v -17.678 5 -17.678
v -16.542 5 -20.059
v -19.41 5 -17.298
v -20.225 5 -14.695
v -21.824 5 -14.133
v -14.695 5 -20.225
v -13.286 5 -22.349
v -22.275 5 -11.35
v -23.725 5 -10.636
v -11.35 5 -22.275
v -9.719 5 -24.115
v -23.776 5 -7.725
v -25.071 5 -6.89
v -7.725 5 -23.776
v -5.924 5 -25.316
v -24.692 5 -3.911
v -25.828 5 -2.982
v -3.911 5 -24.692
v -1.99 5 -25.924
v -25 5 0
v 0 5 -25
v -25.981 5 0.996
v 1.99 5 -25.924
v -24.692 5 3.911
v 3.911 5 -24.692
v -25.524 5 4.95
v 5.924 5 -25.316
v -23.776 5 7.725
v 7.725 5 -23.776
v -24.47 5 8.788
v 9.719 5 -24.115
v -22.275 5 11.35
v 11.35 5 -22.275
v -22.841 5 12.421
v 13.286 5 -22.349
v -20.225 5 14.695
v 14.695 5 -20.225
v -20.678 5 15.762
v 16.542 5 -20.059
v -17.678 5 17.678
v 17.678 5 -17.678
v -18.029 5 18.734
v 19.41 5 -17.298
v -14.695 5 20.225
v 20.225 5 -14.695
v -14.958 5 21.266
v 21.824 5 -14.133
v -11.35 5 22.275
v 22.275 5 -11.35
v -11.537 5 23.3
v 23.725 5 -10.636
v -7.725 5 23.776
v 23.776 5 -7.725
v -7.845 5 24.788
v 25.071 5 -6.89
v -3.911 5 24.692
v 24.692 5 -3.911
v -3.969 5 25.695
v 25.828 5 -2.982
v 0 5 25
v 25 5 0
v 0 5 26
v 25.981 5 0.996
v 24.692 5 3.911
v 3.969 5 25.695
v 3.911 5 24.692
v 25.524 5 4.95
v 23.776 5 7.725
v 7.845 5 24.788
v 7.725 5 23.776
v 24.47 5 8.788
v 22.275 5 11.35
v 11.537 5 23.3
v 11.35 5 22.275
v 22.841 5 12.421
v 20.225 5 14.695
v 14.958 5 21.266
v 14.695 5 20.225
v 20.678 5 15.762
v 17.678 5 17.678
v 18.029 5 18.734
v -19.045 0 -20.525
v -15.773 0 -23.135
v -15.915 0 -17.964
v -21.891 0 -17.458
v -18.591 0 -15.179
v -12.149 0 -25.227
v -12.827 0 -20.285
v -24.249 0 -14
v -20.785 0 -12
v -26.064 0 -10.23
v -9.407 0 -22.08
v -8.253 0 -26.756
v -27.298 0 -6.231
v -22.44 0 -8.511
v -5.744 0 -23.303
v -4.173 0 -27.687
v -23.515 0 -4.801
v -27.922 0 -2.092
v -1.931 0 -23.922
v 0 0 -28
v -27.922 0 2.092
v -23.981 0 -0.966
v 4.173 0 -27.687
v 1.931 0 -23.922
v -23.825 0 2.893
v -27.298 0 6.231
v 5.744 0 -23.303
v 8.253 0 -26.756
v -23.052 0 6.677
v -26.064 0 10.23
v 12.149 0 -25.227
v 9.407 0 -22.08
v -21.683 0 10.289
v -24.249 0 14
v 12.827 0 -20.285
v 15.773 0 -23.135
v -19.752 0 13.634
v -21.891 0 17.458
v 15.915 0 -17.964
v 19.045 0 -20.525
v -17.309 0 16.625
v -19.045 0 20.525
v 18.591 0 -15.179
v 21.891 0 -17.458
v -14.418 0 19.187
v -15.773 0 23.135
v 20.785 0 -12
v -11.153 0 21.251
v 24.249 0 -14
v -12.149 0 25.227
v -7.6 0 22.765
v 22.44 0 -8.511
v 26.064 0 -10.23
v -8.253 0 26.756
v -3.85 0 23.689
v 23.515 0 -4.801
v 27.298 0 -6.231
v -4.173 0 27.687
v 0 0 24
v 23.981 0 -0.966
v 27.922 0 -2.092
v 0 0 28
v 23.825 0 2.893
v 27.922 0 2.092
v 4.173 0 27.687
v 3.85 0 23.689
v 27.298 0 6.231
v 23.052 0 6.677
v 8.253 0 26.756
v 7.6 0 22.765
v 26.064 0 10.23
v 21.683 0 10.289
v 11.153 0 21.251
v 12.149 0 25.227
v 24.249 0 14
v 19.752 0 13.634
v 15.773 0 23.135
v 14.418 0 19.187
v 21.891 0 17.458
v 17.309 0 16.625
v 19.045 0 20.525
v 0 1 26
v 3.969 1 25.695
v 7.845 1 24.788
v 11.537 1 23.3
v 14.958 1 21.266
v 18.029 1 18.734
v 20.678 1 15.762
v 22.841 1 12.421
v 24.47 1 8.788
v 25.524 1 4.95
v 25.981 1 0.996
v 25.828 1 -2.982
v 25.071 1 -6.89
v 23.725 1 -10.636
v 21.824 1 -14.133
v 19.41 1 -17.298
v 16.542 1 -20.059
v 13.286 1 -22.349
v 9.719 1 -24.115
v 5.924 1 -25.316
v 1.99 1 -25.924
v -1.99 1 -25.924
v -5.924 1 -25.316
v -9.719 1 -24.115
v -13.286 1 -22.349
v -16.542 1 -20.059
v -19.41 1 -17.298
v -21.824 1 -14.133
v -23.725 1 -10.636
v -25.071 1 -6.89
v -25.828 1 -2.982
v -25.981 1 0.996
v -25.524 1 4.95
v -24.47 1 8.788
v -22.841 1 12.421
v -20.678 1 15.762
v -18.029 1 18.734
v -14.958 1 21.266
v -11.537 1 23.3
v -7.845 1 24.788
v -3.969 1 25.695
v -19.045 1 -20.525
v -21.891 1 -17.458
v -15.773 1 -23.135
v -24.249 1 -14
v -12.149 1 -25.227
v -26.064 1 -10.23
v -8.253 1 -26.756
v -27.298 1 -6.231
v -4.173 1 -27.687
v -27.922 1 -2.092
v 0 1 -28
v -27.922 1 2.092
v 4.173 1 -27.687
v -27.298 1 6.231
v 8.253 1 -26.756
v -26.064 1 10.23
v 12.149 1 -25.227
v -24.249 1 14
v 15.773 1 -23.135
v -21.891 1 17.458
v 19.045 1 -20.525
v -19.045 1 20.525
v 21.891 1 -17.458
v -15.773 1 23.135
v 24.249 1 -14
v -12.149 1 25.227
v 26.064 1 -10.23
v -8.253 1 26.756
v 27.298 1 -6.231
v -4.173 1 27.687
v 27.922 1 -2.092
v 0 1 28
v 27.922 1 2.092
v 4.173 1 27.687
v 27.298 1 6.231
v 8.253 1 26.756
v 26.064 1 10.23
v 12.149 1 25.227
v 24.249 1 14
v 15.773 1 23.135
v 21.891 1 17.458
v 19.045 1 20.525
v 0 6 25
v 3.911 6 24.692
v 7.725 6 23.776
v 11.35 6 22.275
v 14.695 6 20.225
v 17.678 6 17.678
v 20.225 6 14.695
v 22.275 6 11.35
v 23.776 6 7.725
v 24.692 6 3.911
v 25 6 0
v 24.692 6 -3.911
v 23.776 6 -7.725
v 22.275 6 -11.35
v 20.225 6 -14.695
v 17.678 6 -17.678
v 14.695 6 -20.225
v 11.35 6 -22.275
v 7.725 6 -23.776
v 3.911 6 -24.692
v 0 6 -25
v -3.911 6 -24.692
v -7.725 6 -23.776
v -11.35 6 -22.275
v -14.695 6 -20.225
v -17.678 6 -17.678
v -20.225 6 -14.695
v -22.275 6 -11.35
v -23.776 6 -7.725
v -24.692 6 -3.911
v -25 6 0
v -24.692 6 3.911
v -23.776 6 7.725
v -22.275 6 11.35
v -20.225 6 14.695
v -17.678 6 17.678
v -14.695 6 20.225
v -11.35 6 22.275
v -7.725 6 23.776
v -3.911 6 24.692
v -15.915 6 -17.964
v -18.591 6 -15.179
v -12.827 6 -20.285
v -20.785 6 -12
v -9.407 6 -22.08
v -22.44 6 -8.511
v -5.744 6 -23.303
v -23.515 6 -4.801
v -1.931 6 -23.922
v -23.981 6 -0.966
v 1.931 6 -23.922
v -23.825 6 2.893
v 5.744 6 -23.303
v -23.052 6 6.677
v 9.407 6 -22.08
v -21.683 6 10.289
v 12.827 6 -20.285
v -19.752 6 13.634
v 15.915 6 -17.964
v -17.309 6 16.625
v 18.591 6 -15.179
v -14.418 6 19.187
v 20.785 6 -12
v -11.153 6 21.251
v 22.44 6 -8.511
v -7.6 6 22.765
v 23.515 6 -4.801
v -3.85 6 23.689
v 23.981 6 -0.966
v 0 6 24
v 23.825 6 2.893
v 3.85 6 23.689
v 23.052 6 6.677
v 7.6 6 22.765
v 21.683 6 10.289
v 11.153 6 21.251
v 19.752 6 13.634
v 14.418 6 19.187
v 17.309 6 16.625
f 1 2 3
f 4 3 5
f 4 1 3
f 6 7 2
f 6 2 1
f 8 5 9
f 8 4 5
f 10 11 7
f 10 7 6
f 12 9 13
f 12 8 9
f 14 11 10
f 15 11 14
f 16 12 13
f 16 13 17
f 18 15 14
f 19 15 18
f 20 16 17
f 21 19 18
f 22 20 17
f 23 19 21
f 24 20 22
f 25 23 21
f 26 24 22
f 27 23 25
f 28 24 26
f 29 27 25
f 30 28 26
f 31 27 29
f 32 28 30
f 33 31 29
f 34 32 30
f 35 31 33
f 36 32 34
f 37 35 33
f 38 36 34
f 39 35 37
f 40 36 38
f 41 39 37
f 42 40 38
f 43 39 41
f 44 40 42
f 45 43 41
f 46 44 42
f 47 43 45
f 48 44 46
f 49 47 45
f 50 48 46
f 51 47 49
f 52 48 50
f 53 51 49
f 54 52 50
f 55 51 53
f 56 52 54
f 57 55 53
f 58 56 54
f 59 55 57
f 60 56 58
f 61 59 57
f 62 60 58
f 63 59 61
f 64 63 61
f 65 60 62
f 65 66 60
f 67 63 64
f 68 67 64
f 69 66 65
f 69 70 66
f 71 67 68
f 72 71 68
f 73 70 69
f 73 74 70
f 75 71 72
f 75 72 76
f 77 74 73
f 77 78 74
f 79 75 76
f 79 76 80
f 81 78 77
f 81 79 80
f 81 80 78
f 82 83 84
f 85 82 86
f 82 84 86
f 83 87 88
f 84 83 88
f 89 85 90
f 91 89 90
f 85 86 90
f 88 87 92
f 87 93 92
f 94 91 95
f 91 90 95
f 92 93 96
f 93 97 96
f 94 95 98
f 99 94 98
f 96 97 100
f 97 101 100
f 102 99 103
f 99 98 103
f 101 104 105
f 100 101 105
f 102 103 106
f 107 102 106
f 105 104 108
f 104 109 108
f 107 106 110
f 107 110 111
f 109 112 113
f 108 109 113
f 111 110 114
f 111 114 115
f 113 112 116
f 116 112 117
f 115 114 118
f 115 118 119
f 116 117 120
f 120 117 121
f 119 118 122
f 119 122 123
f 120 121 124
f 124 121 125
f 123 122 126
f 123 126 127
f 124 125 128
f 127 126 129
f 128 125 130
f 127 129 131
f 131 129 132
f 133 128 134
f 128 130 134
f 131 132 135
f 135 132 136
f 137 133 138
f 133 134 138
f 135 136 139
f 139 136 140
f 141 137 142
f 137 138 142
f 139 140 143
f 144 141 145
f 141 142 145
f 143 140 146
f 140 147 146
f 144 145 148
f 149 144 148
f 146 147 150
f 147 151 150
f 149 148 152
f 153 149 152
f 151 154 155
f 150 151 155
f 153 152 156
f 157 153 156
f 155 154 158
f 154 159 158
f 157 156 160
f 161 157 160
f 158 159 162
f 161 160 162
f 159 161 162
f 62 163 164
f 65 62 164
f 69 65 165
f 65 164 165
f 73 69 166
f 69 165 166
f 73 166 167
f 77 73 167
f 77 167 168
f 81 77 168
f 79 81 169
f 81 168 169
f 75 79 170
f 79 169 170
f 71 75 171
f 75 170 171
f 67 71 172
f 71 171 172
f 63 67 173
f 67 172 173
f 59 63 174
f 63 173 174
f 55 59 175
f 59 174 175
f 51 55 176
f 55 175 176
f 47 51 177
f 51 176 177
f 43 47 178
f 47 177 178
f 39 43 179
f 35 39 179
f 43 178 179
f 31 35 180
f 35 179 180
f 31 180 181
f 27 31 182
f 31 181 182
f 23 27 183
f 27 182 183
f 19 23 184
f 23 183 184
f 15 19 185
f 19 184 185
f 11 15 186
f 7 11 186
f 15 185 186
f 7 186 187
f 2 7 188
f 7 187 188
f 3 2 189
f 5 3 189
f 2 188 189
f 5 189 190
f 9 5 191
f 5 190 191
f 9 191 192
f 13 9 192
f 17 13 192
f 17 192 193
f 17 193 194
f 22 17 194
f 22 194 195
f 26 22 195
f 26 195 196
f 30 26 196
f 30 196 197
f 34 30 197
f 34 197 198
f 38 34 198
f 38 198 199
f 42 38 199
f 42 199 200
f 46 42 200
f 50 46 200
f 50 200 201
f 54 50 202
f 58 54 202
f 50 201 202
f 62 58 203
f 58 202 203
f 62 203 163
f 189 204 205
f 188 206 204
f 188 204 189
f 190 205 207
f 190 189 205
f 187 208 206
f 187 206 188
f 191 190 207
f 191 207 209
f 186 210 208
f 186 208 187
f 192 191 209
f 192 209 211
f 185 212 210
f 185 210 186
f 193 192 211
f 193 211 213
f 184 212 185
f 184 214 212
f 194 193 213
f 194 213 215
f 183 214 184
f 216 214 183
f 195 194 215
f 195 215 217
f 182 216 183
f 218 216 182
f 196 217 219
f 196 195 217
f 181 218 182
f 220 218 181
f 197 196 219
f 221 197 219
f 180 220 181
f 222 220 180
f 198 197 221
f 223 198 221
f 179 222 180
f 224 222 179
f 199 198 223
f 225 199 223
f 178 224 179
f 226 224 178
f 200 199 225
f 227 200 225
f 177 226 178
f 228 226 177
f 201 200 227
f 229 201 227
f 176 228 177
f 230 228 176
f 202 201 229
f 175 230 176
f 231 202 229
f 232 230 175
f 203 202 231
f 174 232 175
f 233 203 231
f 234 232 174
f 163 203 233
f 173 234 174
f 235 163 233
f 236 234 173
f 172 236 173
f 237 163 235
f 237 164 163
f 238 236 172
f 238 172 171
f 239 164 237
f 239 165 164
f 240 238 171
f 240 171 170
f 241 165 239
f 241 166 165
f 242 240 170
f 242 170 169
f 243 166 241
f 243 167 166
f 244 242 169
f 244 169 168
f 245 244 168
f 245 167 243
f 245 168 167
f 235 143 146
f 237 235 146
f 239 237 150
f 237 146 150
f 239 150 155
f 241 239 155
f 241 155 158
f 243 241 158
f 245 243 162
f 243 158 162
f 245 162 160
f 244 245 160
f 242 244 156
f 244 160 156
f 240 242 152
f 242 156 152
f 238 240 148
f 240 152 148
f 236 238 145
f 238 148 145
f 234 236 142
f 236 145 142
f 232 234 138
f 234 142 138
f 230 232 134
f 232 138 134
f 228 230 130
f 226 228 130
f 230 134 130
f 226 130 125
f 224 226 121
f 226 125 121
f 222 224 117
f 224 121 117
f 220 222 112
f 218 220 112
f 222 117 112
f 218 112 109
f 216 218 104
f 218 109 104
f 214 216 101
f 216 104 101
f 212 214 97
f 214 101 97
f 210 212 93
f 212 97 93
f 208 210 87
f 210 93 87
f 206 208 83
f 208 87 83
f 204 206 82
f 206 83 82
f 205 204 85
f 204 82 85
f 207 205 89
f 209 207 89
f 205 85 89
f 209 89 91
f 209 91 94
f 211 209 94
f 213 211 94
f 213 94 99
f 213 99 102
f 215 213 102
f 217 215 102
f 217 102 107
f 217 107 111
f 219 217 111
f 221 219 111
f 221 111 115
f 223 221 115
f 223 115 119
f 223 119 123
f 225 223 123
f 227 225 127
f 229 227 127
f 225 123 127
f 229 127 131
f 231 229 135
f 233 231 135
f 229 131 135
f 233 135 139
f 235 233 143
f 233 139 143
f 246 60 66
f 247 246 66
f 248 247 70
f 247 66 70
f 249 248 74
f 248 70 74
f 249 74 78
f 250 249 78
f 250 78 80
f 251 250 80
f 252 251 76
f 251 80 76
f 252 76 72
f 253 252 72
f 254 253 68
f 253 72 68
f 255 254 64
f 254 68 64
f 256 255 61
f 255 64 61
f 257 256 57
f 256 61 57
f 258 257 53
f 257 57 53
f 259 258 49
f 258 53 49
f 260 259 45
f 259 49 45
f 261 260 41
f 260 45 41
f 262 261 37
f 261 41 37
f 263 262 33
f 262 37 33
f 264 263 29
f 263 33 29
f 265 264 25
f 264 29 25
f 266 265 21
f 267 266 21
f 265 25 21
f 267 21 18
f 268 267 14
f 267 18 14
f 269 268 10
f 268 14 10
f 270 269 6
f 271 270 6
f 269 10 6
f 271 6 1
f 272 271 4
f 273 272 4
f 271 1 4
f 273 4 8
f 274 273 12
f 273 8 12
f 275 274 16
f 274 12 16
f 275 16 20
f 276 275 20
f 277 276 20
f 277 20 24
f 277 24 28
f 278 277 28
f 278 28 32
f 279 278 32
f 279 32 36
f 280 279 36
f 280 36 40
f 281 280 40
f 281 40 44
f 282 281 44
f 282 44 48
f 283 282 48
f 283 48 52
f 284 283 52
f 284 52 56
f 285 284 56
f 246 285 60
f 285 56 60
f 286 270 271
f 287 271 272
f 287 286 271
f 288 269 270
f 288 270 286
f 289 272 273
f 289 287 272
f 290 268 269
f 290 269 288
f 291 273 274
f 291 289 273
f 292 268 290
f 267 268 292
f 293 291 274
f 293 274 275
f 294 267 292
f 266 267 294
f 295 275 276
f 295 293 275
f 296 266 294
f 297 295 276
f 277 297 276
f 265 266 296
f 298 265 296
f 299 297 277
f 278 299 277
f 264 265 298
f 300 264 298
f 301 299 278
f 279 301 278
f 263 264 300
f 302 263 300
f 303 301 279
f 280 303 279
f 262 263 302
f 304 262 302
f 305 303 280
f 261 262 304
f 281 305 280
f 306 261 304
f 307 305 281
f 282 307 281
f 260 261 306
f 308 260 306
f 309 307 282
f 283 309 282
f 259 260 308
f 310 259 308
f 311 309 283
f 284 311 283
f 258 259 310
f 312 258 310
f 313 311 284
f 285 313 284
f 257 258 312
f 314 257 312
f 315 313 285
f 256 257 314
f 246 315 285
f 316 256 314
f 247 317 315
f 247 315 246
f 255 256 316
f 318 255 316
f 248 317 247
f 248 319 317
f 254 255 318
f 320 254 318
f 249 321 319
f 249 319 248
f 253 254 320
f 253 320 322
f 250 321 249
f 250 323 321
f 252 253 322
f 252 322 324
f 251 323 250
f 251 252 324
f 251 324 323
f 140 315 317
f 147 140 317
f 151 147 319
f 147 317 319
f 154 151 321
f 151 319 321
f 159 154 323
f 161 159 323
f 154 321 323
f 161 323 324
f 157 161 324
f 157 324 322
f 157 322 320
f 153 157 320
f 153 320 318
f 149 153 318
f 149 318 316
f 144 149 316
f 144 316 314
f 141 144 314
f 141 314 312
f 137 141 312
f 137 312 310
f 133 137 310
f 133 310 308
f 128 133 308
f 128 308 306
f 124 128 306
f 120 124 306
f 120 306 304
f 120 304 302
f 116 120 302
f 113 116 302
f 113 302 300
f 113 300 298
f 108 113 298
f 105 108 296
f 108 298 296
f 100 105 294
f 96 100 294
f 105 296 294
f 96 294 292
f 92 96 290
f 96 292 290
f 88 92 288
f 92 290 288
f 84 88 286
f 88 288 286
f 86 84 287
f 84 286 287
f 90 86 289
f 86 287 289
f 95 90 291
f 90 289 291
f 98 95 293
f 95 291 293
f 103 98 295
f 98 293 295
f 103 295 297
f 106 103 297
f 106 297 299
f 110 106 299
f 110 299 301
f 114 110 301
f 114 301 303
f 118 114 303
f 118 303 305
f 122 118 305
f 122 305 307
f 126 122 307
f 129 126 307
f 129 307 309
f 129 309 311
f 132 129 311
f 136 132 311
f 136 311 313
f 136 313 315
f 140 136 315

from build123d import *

# Parameters (mm, degrees)
ESQUISSE1_R             = 28
BOSS_EXTRU_2_DEPTH      = 1
ESQUISSE2_R             = 26
ESQUISSE2_R_2           = 24
BOSS_EXTRU_5_DEPTH      = 4
ESQUISSE6_R             = 25
BOSS_EXTRU_6_DEPTH      = 1
ESQUISSE7_R             = 24
ENL_V_MAT_EXTRU_2_DEPTH = 41.049968789


with BuildPart() as part:
    # Esquisse1 → Boss.-Extru.2 (new body)
    with BuildSketch(Plane(origin=(0, 0, 0), x_dir=(1, 0, 0), z_dir=(0, 1, 0))):
        with Locations(Location((0, 0, 0), (0, 0, 270))):
            Circle(ESQUISSE1_R)
    extrude(amount=BOSS_EXTRU_2_DEPTH)

    # Esquisse2 → Boss.-Extru.5 (add)
    with BuildSketch(Plane(origin=(0, 1, 0), x_dir=(1, 0, 0), z_dir=(0, 1, 0))):
        with Locations(Location((0, 0, 0), (0, 0, 270))):
            Circle(ESQUISSE2_R)
        with Locations(Location((0, 0, 0), (0, 0, 270))):
            Circle(ESQUISSE2_R_2, mode=Mode.SUBTRACT)
    extrude(amount=BOSS_EXTRU_5_DEPTH)

    # Esquisse6 → Boss.-Extru.6 (add)
    with BuildSketch(Plane(origin=(0, 5, 0), x_dir=(1, 0, 0), z_dir=(0, 1, 0))):
        with Locations(Location((0, 0, 0), (0, 0, 270))):
            Circle(ESQUISSE6_R)
    extrude(amount=BOSS_EXTRU_6_DEPTH)

    # Esquisse7 → Enlèv. mat.-Extru.2 (cut, through all)
    with BuildSketch(Plane(origin=(0, 6, 0), x_dir=(1, 0, 0), z_dir=(0, 1, 0))):
        with Locations(Location((0, 0, 0), (0, 0, 270))):
            Circle(ESQUISSE7_R)
    extrude(amount=-ENL_V_MAT_EXTRU_2_DEPTH, mode=Mode.SUBTRACT)


solid = part.part
